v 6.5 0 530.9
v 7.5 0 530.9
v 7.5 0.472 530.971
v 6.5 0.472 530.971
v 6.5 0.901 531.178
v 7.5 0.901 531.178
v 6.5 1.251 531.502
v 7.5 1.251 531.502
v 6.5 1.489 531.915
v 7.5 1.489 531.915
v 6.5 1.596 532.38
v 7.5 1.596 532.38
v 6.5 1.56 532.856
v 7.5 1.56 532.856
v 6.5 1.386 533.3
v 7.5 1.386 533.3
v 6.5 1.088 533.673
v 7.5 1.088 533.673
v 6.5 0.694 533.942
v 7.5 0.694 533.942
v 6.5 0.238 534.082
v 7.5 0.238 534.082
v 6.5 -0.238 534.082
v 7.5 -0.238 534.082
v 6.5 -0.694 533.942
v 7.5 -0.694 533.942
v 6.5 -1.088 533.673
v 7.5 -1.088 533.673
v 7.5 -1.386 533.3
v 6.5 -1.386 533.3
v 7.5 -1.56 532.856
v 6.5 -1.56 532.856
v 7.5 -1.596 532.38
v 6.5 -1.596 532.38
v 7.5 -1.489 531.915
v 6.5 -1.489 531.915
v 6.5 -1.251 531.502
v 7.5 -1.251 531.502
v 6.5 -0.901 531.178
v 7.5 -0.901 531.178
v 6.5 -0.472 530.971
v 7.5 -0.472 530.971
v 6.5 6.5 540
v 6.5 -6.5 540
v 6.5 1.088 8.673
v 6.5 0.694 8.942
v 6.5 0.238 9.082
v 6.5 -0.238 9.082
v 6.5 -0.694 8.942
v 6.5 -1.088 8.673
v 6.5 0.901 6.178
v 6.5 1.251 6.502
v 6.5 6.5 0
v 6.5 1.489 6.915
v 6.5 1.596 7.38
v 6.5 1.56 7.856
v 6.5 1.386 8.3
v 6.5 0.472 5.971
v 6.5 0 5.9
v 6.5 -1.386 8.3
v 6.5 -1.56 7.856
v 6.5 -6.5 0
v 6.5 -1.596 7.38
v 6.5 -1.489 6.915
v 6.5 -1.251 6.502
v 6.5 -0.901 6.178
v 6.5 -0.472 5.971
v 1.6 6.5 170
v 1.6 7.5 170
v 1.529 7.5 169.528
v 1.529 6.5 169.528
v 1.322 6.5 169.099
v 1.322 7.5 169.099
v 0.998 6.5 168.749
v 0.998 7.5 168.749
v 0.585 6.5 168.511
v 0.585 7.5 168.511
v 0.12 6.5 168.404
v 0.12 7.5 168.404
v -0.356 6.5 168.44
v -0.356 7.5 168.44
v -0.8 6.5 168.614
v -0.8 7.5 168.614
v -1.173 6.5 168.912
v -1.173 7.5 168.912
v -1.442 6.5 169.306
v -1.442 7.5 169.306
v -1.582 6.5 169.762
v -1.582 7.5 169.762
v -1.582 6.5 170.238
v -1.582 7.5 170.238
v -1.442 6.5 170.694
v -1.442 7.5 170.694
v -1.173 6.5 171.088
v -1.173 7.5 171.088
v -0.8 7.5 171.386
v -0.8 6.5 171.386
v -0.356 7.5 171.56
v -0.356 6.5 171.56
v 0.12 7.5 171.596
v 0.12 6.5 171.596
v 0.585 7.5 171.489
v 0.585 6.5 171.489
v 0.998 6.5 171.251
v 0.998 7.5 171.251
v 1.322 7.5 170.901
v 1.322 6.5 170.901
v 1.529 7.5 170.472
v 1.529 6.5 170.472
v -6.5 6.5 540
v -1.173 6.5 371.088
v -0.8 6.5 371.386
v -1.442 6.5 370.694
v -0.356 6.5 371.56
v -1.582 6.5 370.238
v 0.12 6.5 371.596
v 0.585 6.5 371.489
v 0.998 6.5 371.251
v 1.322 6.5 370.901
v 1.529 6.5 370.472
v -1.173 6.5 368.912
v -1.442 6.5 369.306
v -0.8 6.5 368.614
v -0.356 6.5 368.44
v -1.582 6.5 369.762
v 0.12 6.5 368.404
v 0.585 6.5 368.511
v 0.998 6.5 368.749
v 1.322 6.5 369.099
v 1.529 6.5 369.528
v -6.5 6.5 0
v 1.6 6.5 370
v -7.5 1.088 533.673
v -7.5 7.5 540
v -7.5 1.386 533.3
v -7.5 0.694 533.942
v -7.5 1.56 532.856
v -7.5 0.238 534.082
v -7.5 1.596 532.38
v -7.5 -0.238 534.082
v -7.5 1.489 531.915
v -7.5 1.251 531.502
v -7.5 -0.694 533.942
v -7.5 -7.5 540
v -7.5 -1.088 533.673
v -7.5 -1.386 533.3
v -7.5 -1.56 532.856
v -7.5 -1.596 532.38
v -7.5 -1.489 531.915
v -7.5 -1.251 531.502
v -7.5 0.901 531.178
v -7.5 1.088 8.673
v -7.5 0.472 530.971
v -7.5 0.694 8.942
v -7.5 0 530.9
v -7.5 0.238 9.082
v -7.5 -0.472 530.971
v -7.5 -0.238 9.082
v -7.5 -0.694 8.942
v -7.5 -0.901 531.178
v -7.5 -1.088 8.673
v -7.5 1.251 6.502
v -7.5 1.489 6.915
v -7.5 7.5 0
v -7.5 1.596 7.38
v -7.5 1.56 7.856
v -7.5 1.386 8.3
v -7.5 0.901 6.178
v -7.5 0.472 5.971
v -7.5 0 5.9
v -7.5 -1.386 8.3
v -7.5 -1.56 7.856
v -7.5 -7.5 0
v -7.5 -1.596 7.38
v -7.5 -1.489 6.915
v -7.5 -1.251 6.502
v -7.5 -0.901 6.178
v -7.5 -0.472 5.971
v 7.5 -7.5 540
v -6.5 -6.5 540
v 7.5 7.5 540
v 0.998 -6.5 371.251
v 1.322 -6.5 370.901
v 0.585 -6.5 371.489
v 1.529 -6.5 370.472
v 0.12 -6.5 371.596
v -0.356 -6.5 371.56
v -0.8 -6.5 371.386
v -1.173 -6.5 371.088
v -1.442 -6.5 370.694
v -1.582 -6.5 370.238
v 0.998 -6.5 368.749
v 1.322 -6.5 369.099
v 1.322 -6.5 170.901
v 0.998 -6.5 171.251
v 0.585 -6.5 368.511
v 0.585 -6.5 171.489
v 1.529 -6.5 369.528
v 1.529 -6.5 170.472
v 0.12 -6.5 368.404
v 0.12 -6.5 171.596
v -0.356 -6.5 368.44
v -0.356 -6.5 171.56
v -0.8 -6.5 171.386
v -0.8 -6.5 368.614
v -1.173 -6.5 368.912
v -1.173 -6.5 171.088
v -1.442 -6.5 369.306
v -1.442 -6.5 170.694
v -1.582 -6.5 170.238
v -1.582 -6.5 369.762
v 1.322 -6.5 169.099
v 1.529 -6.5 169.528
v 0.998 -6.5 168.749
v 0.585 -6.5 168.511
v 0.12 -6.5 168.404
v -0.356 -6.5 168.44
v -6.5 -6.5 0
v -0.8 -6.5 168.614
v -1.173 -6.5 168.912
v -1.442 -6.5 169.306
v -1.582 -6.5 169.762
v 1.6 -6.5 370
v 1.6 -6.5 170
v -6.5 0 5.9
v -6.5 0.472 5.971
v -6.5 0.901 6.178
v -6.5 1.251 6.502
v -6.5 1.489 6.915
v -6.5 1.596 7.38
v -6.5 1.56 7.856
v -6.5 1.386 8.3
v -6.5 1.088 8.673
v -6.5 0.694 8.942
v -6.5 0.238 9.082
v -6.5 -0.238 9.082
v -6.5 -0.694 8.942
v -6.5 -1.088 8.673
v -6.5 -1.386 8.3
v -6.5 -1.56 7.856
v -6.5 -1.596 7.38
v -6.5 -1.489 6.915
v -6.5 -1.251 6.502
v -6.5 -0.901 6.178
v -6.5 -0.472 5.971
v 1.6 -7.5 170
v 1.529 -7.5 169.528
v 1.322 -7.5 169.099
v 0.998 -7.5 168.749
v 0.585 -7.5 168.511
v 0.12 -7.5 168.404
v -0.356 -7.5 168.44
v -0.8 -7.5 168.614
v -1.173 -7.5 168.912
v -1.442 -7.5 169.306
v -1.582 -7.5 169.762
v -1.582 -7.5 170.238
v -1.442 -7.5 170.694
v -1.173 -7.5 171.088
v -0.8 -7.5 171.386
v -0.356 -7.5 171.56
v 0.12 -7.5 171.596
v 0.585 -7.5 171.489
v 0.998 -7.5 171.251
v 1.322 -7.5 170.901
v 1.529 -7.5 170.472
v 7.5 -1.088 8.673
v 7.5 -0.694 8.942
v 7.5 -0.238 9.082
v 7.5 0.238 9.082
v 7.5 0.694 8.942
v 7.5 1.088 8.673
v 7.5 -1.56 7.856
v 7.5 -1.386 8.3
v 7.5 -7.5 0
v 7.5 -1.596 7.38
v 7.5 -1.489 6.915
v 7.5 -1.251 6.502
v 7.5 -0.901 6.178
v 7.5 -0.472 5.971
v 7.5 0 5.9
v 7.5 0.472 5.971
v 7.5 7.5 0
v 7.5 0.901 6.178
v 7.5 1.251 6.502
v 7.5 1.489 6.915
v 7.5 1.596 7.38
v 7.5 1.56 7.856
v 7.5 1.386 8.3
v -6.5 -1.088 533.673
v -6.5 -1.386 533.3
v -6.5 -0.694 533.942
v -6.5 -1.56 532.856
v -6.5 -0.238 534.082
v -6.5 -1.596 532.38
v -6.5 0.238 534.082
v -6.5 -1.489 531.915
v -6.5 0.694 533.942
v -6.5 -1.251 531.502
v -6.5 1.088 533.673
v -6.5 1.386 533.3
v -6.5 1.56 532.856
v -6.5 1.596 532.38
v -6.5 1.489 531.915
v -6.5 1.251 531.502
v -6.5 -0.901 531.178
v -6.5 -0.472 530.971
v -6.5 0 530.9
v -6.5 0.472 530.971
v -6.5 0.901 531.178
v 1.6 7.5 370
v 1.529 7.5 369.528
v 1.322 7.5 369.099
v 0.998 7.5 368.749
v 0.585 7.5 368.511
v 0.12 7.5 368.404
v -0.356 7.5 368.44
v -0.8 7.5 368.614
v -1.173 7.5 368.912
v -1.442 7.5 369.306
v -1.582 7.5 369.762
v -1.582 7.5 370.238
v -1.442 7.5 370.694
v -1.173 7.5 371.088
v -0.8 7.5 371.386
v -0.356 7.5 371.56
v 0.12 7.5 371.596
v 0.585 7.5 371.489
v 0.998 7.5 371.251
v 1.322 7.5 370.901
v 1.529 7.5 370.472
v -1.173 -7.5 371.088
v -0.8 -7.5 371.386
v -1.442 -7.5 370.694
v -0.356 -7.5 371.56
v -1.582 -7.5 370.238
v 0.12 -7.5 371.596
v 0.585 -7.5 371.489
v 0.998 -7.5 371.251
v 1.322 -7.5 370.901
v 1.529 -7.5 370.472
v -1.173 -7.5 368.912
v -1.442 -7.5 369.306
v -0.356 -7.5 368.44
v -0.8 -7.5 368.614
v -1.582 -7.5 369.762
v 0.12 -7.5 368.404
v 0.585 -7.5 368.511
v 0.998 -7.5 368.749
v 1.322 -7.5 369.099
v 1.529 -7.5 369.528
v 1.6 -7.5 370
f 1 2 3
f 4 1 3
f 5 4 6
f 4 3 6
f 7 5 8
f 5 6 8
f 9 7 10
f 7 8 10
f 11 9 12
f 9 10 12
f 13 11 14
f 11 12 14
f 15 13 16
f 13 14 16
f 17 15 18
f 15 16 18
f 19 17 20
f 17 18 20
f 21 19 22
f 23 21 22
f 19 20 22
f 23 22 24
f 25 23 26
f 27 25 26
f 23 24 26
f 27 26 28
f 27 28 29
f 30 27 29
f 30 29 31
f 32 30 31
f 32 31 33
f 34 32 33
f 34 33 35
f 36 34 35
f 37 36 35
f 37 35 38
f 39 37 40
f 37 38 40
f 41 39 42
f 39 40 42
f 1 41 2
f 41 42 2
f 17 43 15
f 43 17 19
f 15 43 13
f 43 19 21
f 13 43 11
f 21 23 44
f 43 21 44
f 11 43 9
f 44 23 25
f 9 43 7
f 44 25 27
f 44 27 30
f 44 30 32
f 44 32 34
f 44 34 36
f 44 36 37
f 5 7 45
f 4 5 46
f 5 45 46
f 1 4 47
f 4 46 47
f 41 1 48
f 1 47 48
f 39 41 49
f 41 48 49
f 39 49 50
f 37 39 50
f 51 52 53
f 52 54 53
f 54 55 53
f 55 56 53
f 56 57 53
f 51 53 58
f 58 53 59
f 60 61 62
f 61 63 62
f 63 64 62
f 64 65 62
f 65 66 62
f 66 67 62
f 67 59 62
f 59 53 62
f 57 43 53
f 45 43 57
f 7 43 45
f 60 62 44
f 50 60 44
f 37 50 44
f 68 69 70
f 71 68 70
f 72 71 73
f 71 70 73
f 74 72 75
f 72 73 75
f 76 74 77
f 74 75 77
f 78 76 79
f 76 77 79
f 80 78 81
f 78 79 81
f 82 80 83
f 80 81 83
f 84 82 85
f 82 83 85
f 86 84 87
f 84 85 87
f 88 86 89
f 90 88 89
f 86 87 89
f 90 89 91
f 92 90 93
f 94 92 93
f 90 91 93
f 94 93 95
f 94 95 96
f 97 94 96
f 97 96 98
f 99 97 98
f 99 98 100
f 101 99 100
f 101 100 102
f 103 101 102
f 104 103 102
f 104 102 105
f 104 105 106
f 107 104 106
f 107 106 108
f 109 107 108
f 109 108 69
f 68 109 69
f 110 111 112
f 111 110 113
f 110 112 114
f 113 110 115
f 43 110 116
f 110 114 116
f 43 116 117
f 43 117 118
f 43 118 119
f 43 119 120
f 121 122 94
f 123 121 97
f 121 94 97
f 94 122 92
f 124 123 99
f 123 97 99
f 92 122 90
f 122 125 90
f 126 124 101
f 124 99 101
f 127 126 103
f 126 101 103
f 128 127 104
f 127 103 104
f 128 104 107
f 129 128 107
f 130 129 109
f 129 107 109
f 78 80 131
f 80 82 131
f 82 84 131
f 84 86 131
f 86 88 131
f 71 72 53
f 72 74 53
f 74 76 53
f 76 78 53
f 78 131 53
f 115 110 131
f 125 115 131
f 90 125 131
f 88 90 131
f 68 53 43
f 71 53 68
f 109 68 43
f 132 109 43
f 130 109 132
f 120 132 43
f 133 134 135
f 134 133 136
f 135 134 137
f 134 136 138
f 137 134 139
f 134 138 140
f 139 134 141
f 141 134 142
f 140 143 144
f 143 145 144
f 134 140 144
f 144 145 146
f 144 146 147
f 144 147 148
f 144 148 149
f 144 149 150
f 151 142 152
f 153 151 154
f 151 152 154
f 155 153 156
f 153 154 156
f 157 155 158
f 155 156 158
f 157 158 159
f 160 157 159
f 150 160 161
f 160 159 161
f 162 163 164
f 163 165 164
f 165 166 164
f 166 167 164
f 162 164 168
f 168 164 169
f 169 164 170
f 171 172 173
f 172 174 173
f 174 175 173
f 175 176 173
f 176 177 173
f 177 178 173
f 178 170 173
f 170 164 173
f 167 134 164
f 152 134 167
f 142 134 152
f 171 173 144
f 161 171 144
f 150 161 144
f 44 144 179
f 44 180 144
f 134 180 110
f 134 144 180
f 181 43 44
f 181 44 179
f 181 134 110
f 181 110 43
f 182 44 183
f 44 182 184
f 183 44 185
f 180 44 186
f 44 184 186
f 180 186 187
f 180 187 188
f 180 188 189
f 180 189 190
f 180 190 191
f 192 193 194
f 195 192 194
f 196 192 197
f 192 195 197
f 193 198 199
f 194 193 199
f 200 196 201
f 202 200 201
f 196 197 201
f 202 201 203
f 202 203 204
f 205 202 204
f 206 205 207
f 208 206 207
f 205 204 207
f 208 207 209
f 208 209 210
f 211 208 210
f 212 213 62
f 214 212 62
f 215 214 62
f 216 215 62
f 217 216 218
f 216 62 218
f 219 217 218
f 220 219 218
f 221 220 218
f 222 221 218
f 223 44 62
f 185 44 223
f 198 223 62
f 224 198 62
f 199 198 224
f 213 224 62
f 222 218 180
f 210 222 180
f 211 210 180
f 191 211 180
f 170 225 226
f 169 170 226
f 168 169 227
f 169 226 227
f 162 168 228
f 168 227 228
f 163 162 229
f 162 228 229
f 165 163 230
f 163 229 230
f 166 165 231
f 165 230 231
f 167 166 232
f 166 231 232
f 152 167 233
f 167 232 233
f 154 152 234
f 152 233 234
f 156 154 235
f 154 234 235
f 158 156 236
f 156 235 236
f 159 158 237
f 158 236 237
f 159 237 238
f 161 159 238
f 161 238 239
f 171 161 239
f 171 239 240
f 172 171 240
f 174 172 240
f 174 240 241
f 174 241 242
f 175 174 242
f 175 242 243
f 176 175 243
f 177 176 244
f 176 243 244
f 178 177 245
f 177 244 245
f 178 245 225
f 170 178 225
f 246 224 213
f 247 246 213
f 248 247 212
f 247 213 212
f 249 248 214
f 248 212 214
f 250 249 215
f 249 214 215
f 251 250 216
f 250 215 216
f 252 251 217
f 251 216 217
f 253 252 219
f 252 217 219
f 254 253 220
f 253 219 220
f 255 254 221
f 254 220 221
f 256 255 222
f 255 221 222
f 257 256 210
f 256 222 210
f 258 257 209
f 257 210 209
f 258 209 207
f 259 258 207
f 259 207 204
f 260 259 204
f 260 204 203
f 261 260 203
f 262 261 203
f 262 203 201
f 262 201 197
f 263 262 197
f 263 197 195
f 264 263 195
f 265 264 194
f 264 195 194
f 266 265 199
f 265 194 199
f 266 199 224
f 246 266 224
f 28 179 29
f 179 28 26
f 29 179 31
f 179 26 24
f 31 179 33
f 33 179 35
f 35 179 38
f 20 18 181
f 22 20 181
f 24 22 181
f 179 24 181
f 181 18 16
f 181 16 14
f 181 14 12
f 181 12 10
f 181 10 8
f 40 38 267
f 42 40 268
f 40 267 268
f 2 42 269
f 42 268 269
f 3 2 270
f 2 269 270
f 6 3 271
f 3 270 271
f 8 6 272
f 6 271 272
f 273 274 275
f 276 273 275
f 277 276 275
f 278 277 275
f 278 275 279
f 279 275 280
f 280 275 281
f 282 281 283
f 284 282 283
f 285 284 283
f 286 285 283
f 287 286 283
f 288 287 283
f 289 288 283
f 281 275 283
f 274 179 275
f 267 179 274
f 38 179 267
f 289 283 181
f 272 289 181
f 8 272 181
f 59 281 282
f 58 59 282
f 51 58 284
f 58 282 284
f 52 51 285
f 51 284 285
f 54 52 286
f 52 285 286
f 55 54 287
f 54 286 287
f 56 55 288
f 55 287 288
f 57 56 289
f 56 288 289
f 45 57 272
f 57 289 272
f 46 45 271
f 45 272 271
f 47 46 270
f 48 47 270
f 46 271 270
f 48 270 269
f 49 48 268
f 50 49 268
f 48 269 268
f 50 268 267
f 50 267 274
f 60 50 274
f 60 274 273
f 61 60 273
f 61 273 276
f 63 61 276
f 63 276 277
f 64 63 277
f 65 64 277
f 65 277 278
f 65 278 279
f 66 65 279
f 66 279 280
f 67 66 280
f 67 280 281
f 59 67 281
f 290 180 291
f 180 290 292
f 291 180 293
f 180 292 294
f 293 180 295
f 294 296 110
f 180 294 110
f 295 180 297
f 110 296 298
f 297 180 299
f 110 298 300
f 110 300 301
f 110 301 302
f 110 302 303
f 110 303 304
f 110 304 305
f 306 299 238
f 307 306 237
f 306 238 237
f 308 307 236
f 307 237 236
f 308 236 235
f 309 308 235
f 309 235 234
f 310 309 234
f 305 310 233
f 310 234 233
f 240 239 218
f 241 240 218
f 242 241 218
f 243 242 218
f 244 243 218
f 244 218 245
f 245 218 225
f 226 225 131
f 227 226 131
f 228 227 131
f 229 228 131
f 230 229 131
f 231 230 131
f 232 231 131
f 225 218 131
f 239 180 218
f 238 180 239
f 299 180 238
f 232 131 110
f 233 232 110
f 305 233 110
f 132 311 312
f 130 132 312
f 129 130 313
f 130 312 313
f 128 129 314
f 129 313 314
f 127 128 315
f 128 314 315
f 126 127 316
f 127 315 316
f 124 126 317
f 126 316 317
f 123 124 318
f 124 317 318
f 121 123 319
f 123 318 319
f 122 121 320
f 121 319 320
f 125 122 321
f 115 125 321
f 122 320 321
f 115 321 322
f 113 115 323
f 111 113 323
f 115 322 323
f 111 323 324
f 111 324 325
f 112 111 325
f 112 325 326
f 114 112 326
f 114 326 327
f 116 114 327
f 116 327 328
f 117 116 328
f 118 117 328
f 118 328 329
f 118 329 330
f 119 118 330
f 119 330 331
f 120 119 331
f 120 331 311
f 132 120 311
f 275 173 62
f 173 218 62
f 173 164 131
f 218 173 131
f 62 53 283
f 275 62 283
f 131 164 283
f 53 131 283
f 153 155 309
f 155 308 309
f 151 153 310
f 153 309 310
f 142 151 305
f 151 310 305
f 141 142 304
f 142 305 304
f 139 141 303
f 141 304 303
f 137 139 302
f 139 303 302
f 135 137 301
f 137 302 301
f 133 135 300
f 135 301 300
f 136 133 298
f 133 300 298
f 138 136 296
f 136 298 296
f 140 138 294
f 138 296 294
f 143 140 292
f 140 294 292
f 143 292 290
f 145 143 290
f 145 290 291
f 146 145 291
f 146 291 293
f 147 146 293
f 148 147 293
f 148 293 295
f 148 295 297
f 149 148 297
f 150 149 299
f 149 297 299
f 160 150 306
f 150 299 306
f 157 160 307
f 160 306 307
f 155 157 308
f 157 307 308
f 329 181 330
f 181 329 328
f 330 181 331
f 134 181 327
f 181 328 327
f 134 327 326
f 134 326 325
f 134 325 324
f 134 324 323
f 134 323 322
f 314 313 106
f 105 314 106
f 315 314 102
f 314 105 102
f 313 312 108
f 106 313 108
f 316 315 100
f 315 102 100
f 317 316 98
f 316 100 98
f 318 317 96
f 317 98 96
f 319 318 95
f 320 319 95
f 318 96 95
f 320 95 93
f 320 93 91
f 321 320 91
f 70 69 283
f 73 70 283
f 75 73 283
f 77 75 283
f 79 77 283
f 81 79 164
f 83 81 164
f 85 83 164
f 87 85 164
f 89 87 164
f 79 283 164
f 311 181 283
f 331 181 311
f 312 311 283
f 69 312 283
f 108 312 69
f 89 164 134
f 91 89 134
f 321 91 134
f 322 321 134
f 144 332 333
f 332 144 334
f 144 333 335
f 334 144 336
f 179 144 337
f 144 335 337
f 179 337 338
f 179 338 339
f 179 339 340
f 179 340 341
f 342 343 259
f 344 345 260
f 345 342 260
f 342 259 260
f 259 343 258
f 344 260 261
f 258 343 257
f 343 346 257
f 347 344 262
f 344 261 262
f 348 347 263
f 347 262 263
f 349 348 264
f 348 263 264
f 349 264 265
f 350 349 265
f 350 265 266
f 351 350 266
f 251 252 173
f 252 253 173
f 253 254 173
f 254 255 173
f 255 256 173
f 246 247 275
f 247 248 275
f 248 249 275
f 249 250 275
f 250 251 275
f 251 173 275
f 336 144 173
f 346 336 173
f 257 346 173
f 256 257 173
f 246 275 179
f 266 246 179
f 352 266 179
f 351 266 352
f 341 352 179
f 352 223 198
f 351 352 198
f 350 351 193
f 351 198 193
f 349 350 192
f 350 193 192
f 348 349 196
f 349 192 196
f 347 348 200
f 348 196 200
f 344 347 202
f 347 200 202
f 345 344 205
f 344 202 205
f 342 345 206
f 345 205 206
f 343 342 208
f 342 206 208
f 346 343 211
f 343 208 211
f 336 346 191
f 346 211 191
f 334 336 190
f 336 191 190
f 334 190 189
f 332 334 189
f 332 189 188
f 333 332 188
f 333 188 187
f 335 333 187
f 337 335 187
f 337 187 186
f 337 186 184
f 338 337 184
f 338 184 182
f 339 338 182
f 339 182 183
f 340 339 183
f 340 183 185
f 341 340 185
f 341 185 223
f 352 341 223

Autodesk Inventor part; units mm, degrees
ref_plane "YZ Plane" through (0, 0, 0) normal (1, 0, 0) x (0, 1, 0)
ref_plane "XZ Plane" through (0, 0, 0) normal (0, 1, 0) x (-1, 0, 0)
ref_plane "XY Plane" through (0, 0, 0) normal (0, 0, 1) x (1, 0, 0)
sketch "スケッチ1" plane through (0, 0, 0) normal (0, 0, 1) x (1, 0, 0)
  line L0 (7.5, 7.5) -> (-7.5, 7.5)
  line L1 (-7.5, 7.5) -> (-7.5, -7.5)
  line L2 (-7.5, -7.5) -> (7.5, -7.5)
  line L3 (7.5, -7.5) -> (7.5, 7.5)
  line L4 (7.5, 7.5) -> (-7.5, -7.5) construction
  line L5 (-7.5, 7.5) -> (7.5, -7.5) construction
  line L6 (-6.5, 6.5) -> (6.5, 6.5)
  line L7 (6.5, 6.5) -> (6.5, -6.5)
  line L8 (6.5, -6.5) -> (-6.5, -6.5)
  line L9 (-6.5, -6.5) -> (-6.5, 6.5)
  point P0 (0, 0)
  dimension "d0" = 15
  dimension "d1" = 15
  dimension "d2" = 1
extrude "押し出し1" add sketch "スケッチ1" along normal blind 540
sketch "スケッチ2" plane through (7.5, -7.5, 0) normal (1, 0, 0) x (0, 0, -1)
  circle A0 centre (-7.5, 7.5) radius 1.6
  line L0 (0, 15) -> (-540, 15) projected
  circle A1 centre (-532.5, 7.5) radius 1.6
  line L1 (-540, 0) -> (-540, 15) projected
  point P0 (0, 7.5)
  dimension "d5" = 3.2
  dimension "d6" = 7.5
  dimension "d7" = 7.5
  dimension "d8" = 3.2
  dimension "d9" = 7.5
  dimension "d10" = 7.5
extrude "押し出し2" cut sketch "スケッチ2" against normal through all
sketch "スケッチ3" plane through (-7.5, 7.5, 0) normal (0, 1, 0) x (1, 0, 0)
  circle A0 centre (7.5, -170) radius 1.6
  circle A1 centre (7.5, -370) radius 1.6
  line L0 (15, 0) -> (0, 0) projected
  point P0 (7.5, 0)
  point P1 (7.5, 0)
  dimension "d13" = 3.2
  dimension "d14" = 3.2
  dimension "d15" = 200
  dimension "d16" = 170
extrude "押し出し3" cut sketch "スケッチ3" against normal through all
properties part number "プレート保持_角柱2"
